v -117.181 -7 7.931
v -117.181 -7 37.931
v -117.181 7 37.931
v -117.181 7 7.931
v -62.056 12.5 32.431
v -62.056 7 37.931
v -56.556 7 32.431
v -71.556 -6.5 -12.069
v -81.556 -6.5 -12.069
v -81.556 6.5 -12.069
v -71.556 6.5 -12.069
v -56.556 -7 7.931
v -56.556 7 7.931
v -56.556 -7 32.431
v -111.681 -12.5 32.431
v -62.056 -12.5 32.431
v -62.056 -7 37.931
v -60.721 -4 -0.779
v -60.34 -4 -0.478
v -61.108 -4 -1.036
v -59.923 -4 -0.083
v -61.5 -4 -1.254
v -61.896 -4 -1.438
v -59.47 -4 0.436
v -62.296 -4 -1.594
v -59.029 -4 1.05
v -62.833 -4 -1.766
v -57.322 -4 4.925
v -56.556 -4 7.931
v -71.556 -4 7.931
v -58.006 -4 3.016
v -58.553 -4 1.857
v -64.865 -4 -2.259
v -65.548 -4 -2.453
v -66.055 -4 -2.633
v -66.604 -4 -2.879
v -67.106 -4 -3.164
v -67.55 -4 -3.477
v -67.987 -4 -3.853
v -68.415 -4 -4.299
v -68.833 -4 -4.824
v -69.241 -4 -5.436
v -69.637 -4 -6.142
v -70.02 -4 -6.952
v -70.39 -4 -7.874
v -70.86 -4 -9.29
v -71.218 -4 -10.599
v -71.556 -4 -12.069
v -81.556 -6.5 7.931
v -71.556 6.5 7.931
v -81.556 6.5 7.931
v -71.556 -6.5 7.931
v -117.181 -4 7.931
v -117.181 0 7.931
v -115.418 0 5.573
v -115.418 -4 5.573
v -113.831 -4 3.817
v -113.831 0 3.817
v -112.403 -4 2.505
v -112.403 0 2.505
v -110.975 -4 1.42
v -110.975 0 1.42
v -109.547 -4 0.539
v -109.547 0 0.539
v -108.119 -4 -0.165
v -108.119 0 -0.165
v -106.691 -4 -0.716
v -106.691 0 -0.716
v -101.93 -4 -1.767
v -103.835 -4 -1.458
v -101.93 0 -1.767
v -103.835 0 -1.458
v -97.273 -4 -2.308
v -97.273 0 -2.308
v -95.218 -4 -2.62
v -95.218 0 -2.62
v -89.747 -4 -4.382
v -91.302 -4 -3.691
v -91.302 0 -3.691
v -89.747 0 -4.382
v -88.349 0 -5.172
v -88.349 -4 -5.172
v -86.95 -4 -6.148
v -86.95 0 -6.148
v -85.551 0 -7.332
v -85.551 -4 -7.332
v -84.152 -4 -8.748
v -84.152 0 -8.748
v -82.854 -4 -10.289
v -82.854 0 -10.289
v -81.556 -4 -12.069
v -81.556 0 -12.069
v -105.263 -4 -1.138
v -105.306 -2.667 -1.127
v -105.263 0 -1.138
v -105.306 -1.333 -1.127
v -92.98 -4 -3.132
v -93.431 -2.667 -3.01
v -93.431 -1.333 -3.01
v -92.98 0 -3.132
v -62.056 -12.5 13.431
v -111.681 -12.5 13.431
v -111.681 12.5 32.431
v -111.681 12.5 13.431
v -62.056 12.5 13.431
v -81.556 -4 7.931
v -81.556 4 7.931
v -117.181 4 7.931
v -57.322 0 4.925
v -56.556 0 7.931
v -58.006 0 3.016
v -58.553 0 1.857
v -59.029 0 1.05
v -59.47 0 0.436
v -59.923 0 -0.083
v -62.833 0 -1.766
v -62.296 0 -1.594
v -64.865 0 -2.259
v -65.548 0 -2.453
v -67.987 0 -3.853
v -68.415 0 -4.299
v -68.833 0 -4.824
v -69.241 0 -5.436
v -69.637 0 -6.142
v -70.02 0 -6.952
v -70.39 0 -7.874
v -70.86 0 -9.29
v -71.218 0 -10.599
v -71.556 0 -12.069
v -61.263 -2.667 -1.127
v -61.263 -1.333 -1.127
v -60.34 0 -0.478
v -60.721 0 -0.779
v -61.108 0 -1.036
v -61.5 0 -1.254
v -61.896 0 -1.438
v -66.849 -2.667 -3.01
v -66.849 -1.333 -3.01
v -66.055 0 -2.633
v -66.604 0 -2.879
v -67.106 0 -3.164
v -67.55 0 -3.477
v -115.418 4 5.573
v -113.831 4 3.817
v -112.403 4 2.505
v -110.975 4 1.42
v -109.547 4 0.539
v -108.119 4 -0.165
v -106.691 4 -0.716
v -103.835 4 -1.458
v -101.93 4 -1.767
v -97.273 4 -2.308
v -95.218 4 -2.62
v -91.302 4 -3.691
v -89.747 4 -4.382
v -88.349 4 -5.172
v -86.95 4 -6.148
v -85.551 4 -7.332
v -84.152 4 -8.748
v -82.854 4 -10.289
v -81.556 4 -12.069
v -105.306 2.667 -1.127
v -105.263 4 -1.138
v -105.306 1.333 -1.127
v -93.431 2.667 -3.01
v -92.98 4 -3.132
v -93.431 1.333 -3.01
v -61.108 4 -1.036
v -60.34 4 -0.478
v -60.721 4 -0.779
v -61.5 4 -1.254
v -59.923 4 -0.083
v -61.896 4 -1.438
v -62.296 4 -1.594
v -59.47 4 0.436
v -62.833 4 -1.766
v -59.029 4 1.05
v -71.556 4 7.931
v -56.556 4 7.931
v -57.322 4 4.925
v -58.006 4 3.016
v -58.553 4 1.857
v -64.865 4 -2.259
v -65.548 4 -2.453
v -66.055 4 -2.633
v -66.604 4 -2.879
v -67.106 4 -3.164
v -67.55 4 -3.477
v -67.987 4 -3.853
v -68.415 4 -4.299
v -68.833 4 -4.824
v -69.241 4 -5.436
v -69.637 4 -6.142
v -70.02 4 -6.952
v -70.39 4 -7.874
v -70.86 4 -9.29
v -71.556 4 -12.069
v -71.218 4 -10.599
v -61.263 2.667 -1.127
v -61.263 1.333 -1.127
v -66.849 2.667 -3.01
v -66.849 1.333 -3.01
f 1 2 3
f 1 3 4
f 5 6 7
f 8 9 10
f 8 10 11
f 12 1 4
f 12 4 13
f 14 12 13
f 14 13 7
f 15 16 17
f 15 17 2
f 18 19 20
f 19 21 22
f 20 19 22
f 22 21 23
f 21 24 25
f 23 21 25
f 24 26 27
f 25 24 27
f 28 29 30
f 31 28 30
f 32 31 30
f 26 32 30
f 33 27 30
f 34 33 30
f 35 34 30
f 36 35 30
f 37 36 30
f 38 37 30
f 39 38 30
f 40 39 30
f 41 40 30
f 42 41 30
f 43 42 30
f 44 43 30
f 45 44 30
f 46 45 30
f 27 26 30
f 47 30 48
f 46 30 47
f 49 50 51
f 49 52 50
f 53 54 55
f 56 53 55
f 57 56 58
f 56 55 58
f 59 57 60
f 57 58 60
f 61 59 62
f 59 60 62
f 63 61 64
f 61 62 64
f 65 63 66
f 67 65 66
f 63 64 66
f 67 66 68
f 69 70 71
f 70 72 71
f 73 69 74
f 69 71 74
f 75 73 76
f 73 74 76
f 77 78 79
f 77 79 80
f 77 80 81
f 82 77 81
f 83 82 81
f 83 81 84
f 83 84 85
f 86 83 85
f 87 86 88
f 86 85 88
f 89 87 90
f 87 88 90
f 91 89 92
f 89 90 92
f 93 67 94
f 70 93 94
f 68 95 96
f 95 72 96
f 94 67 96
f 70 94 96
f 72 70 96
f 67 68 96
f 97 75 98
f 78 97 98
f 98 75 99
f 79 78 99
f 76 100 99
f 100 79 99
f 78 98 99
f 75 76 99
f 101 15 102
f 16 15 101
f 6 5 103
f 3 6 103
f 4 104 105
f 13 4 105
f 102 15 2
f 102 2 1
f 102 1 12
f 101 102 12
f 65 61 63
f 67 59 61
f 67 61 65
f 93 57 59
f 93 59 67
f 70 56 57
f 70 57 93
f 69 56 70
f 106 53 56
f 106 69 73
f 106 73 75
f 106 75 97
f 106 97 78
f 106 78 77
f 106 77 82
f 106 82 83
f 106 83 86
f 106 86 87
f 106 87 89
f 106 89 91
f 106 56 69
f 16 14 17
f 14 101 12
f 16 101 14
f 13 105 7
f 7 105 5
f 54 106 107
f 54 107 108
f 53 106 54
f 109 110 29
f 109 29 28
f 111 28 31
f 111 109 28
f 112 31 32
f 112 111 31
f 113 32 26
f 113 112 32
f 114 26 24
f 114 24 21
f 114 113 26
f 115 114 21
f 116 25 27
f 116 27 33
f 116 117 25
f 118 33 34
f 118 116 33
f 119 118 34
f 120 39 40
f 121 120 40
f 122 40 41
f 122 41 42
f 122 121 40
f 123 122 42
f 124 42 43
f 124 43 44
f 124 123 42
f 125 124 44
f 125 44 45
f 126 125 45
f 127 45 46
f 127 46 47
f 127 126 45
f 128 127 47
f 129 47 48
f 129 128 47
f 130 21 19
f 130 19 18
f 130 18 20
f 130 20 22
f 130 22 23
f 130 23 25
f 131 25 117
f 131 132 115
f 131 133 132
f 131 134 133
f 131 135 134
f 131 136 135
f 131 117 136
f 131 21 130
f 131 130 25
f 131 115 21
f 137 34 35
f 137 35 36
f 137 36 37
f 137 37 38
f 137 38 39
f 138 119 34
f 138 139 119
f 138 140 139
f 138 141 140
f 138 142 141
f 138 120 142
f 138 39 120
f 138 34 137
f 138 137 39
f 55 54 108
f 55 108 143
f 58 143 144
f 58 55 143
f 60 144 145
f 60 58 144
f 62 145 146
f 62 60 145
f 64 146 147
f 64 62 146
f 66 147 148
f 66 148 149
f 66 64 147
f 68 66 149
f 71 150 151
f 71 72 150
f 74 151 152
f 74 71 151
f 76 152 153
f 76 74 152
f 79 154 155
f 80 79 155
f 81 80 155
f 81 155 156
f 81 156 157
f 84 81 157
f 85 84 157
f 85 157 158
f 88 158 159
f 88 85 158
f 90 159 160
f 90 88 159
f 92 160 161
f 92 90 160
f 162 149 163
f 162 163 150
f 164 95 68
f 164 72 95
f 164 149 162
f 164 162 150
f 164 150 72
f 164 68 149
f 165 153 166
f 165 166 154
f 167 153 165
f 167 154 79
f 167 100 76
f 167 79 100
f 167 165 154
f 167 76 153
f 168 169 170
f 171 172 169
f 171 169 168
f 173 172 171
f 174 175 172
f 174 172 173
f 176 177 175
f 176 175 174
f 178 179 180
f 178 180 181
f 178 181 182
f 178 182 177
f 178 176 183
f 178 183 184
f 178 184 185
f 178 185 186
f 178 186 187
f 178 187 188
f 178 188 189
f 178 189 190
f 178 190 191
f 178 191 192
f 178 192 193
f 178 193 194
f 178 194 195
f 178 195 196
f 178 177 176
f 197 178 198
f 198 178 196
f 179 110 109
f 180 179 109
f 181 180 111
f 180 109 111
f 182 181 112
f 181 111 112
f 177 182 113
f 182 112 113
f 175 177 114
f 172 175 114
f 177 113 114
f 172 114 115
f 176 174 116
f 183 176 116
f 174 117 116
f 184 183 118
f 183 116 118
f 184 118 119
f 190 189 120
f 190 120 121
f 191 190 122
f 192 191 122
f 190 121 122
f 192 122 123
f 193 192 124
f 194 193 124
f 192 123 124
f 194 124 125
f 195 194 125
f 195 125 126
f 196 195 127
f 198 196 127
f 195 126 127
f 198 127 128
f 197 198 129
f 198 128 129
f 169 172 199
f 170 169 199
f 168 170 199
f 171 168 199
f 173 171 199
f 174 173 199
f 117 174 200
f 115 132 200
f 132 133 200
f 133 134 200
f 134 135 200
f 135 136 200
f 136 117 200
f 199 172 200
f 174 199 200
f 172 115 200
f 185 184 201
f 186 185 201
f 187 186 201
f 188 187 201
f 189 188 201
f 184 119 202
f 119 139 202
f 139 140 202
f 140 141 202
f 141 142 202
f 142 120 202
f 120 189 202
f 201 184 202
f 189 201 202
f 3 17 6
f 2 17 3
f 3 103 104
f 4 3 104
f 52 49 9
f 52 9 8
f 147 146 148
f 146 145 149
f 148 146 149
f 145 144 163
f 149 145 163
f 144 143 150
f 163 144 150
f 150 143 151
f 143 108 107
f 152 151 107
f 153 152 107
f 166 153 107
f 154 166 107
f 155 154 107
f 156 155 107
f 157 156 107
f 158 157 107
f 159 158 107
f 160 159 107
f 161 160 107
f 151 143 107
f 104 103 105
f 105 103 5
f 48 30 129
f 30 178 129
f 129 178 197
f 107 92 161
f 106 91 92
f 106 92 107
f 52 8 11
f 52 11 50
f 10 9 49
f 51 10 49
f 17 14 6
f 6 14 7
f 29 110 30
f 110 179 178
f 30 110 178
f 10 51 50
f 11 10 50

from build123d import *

# Parameters (mm, degrees)
F1_DEPTH = 4
F0_W     = 5
F0_H     = 20
F2_DEPTH = 6.5
F3_DEPTH = 12.5
F4_SIZE  = 5.5


with BuildPart() as f1:
    # F0 (on Front) → F1 (new body, symmetric)
    with BuildSketch(Plane.XZ):
        with BuildLine():
            add(Edge.make_bspline(
                [(-56.556158, 7.931484), (-60.236714, -9.499072), (-67.875602, 5.362041), (-71.556158, -12.068516)],
                knots=[0, 0, 0, 0, 25, 25, 25, 25], degree=3))
            Line((-56.556158, 7.931484), (-71.556158, 7.931484))
            Line((-71.556158, 7.931484), (-71.556158, -12.068516))
        make_face()
        with BuildLine():
            Line((-81.556158, -12.068516), (-81.556158, 7.931484))
            Line((-81.556158, 7.931484), (-117.181165, 7.931484))
            add(Edge.make_bspline(
                [(-117.181165, 7.931484), (-105.306162, -9.499072), (-93.43116, 5.362041), (-81.556158, -12.068516)],
                knots=[0, 0, 0, 0, 40.855123, 40.855123, 40.855123, 40.855123], degree=3))
        make_face()
    extrude(amount=F1_DEPTH, both=True)


with BuildPart() as f2:
    # F0 (on Front) → F2 (new body, symmetric)
    with BuildSketch(Plane.XZ):
        with Locations((-79.056158, -2.068516)):
            Rectangle(F0_W, F0_H)
        with Locations((-74.056158, -2.068516)):
            Rectangle(F0_W, F0_H)
    extrude(amount=F2_DEPTH, both=True)


with BuildPart() as f3:
    # F0 (on Front) → F3 (new body, symmetric)
    with BuildSketch(Plane.XZ):
        Polygon((-81.556158, 7.931484), (-76.556158, 7.931484), (-76.556158, 37.931484), (-117.181165, 37.931484), (-117.181165, 7.931484), align=None)
        Polygon((-71.556158, 7.931484), (-56.556158, 7.931484), (-56.556158, 37.931484), (-76.556158, 37.931484), (-76.556158, 7.931484), align=None)
    extrude(amount=F3_DEPTH, both=True)

    # F4
    f4_edges = [f3.edges().sort_by_distance(p)[0] for p in [
        (-56.556158, 0, 37.931484),
        (-56.556158, -12.5, 22.931484),
        (-86.868661, -12.5, 37.931484),
        (-86.868661, 12.5, 37.931484),
        (-56.556158, 12.5, 22.931484),
        (-117.181165, 12.5, 22.931484),
        (-117.181165, -12.5, 22.931484),
        (-86.868661, -12.5, 7.931484),
        (-86.868661, 12.5, 7.931484),
    ]]
    chamfer(f4_edges, length=F4_SIZE)


solid = Compound([f1.part, f2.part, f3.part])
